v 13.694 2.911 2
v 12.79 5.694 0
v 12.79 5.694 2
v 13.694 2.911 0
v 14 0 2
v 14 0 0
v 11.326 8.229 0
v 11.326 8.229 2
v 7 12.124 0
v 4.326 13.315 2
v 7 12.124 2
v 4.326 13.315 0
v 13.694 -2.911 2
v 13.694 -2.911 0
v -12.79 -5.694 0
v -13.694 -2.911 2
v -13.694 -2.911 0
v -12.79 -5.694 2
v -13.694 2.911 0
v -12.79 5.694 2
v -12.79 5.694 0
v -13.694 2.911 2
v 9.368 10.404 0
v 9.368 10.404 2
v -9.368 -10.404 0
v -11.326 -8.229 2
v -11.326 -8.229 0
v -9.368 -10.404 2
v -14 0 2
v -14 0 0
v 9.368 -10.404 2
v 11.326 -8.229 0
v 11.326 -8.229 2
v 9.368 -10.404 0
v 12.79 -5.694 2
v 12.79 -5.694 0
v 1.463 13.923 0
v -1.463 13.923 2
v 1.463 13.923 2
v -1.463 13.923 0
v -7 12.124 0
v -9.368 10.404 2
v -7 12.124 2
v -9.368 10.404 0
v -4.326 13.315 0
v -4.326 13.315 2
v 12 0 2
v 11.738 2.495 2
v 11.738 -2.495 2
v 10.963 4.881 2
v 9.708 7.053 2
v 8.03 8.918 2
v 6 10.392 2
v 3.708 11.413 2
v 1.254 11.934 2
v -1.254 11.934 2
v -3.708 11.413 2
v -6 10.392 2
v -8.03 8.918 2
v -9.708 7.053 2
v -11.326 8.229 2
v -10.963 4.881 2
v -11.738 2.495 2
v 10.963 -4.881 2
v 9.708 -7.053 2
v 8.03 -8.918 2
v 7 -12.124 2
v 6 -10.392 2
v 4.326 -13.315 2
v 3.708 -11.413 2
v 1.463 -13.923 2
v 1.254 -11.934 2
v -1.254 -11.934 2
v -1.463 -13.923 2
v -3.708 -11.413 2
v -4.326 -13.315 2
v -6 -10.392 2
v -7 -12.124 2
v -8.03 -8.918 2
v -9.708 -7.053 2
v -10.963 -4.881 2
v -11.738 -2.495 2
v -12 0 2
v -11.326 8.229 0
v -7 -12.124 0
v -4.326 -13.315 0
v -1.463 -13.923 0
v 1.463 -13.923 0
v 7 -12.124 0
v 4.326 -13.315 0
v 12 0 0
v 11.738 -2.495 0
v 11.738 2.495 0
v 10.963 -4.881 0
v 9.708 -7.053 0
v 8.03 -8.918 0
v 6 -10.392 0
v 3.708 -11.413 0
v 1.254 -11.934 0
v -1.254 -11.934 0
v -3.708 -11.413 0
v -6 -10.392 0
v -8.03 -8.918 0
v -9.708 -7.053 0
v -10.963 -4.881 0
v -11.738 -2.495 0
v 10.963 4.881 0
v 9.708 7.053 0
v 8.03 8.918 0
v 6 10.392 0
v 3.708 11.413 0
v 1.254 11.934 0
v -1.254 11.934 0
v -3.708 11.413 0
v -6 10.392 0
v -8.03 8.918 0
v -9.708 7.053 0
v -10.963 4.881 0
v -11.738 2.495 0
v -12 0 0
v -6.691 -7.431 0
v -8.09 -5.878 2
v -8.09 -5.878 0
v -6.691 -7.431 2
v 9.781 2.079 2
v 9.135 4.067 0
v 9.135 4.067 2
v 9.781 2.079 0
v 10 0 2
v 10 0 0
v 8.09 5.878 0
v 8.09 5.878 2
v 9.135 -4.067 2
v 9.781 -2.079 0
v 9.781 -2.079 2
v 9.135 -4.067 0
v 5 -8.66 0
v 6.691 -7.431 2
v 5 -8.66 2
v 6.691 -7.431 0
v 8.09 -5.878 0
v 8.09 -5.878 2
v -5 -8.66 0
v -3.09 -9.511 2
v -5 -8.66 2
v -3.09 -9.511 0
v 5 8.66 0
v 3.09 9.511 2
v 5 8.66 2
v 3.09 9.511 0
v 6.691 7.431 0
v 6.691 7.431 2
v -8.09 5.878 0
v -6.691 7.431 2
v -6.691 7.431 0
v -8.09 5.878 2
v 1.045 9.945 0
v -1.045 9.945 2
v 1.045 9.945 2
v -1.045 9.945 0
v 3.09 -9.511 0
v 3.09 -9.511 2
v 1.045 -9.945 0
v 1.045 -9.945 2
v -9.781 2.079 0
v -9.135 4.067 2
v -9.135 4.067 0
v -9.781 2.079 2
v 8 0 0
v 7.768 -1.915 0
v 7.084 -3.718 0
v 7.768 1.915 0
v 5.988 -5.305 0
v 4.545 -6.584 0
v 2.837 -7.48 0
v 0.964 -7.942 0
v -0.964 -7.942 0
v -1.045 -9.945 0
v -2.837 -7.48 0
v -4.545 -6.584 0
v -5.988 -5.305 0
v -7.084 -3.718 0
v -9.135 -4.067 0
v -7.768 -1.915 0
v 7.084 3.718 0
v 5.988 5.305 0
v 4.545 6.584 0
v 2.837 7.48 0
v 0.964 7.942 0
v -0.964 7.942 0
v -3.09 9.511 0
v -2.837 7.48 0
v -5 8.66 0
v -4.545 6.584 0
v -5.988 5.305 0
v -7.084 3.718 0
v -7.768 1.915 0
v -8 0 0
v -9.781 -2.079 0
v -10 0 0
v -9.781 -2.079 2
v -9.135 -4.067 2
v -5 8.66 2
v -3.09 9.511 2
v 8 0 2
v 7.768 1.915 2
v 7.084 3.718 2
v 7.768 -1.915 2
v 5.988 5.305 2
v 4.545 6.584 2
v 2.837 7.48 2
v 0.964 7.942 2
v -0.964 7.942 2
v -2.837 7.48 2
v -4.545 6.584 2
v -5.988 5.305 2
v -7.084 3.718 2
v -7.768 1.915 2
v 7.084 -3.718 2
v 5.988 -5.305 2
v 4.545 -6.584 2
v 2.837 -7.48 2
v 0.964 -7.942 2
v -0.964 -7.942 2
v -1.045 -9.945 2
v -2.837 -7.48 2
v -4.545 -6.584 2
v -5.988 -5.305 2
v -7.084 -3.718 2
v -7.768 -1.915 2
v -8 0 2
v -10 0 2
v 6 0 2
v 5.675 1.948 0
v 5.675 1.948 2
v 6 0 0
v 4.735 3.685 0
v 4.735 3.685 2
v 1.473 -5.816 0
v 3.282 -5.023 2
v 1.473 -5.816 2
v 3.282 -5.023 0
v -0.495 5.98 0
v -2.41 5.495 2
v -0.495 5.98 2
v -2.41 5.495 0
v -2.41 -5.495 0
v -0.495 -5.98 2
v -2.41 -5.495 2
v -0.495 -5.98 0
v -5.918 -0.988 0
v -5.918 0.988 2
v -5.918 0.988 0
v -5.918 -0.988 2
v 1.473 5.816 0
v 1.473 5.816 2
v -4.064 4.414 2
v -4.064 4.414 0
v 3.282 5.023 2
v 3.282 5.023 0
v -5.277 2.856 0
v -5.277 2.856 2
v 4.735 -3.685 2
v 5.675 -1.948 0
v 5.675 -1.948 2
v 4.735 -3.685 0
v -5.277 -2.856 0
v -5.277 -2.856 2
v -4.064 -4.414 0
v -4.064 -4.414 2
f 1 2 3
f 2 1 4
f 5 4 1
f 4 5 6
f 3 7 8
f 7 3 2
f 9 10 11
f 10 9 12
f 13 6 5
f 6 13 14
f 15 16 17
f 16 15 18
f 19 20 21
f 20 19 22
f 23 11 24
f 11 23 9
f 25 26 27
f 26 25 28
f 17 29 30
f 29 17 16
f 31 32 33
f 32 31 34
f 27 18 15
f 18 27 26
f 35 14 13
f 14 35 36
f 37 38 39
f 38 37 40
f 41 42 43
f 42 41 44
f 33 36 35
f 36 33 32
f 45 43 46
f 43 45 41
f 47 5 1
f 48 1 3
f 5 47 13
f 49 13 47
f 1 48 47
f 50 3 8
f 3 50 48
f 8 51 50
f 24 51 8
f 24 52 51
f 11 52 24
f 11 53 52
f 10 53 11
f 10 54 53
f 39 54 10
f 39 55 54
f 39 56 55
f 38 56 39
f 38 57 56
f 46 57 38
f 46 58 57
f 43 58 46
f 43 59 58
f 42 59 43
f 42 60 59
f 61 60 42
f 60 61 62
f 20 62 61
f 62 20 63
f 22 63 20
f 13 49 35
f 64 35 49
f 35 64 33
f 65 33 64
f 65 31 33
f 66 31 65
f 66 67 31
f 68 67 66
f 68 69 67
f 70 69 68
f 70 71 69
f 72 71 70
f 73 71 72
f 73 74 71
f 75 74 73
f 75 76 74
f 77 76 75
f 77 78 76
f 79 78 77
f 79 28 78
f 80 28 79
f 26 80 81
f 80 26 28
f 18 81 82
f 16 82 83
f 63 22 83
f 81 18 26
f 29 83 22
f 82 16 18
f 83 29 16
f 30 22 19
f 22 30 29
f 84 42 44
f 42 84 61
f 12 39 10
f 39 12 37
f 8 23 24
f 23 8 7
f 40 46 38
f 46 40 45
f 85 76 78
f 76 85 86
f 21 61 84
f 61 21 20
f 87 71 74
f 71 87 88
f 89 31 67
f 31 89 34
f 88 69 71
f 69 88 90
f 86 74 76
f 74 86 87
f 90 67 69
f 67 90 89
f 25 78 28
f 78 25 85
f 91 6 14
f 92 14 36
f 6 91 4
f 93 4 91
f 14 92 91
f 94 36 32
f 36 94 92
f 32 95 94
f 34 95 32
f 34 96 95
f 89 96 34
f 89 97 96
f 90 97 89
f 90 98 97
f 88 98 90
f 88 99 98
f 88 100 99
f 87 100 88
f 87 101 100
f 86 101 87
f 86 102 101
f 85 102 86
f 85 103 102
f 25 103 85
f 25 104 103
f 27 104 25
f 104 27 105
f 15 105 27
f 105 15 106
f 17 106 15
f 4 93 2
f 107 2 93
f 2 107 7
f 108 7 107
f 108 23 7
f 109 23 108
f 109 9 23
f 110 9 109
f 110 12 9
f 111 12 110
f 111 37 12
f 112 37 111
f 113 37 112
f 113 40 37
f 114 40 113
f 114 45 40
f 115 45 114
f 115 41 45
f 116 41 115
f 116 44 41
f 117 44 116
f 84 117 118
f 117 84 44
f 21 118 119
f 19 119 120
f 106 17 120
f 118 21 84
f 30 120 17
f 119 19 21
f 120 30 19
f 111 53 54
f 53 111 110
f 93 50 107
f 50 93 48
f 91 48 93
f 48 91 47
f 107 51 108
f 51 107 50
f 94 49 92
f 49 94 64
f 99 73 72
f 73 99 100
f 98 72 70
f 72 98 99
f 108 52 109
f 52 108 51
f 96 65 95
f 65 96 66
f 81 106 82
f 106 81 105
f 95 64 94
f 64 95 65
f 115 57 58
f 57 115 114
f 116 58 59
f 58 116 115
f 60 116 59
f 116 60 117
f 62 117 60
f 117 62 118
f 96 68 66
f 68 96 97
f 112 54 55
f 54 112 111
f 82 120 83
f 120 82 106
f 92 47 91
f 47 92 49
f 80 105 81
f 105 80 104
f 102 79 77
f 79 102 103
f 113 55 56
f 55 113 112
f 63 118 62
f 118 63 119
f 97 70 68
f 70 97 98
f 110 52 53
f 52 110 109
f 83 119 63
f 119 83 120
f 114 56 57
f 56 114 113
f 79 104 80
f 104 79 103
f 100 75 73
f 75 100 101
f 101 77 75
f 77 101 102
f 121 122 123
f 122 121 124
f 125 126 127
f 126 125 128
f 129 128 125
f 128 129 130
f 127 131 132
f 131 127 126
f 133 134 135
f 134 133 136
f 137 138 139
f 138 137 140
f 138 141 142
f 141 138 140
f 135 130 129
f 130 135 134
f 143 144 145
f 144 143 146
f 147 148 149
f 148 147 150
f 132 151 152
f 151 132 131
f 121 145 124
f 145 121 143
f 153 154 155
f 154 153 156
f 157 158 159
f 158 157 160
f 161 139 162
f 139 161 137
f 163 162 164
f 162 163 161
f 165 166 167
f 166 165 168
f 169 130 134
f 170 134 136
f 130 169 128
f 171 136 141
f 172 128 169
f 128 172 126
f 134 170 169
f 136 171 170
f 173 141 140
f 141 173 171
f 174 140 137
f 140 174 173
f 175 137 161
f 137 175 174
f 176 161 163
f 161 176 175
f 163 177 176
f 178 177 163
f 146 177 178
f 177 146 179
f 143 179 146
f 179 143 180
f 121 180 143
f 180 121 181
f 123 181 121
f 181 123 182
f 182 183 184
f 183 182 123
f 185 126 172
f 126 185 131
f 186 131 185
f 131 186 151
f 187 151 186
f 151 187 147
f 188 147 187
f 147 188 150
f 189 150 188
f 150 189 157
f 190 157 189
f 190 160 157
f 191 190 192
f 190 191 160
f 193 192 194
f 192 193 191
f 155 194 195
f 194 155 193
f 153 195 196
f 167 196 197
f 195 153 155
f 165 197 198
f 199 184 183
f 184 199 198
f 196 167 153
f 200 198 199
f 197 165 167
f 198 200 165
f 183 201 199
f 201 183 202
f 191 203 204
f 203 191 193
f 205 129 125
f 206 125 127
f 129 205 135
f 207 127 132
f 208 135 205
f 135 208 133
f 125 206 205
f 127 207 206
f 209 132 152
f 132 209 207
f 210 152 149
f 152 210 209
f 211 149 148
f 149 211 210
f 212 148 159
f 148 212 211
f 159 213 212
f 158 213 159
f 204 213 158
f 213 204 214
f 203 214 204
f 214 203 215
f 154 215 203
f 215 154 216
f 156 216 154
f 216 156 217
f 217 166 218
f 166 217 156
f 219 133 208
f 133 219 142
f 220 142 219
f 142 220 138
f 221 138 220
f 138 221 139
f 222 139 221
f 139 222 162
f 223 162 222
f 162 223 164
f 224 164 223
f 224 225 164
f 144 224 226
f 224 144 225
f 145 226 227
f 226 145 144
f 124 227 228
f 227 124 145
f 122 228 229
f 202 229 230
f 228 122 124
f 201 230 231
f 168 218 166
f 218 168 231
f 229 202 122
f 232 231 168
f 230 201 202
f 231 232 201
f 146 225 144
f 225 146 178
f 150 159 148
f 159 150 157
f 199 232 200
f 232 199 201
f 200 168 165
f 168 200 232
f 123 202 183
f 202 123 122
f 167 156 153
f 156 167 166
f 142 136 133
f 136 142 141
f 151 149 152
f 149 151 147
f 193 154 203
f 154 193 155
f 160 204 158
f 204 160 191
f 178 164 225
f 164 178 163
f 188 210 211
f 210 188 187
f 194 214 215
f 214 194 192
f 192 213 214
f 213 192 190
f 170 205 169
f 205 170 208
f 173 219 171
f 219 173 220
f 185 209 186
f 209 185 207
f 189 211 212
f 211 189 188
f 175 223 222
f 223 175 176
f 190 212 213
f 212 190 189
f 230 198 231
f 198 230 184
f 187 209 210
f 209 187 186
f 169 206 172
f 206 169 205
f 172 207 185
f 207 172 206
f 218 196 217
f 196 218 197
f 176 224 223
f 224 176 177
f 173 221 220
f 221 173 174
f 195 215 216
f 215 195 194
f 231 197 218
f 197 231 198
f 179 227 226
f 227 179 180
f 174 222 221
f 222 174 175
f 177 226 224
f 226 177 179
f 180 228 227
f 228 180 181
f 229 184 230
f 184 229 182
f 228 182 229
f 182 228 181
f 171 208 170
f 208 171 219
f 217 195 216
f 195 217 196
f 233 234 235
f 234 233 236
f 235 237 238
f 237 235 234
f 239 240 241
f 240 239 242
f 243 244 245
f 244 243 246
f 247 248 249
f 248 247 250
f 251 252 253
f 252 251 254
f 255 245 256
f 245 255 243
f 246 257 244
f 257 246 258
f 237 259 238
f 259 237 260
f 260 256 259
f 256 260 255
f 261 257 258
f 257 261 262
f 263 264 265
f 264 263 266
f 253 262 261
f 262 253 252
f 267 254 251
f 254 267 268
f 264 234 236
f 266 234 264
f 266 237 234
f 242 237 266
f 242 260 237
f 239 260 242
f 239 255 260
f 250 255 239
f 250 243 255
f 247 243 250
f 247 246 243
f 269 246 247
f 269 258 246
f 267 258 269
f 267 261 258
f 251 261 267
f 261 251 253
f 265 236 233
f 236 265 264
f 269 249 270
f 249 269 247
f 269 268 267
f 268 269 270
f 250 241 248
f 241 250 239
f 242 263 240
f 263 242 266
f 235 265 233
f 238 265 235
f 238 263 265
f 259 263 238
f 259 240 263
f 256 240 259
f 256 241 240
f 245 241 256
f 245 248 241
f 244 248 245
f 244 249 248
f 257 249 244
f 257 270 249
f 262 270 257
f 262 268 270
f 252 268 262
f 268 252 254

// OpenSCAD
difference() {
    cylinder(h=2, r1=14, r2=14);
    cylinder(h=2, r1=12, r2=12);   
}

difference() {
   cylinder(h=2, r1=10, r2=10);
   cylinder(h=2, r1=8, r2=8);   
}
cylinder(h=2, r1=6, r2=6);   
